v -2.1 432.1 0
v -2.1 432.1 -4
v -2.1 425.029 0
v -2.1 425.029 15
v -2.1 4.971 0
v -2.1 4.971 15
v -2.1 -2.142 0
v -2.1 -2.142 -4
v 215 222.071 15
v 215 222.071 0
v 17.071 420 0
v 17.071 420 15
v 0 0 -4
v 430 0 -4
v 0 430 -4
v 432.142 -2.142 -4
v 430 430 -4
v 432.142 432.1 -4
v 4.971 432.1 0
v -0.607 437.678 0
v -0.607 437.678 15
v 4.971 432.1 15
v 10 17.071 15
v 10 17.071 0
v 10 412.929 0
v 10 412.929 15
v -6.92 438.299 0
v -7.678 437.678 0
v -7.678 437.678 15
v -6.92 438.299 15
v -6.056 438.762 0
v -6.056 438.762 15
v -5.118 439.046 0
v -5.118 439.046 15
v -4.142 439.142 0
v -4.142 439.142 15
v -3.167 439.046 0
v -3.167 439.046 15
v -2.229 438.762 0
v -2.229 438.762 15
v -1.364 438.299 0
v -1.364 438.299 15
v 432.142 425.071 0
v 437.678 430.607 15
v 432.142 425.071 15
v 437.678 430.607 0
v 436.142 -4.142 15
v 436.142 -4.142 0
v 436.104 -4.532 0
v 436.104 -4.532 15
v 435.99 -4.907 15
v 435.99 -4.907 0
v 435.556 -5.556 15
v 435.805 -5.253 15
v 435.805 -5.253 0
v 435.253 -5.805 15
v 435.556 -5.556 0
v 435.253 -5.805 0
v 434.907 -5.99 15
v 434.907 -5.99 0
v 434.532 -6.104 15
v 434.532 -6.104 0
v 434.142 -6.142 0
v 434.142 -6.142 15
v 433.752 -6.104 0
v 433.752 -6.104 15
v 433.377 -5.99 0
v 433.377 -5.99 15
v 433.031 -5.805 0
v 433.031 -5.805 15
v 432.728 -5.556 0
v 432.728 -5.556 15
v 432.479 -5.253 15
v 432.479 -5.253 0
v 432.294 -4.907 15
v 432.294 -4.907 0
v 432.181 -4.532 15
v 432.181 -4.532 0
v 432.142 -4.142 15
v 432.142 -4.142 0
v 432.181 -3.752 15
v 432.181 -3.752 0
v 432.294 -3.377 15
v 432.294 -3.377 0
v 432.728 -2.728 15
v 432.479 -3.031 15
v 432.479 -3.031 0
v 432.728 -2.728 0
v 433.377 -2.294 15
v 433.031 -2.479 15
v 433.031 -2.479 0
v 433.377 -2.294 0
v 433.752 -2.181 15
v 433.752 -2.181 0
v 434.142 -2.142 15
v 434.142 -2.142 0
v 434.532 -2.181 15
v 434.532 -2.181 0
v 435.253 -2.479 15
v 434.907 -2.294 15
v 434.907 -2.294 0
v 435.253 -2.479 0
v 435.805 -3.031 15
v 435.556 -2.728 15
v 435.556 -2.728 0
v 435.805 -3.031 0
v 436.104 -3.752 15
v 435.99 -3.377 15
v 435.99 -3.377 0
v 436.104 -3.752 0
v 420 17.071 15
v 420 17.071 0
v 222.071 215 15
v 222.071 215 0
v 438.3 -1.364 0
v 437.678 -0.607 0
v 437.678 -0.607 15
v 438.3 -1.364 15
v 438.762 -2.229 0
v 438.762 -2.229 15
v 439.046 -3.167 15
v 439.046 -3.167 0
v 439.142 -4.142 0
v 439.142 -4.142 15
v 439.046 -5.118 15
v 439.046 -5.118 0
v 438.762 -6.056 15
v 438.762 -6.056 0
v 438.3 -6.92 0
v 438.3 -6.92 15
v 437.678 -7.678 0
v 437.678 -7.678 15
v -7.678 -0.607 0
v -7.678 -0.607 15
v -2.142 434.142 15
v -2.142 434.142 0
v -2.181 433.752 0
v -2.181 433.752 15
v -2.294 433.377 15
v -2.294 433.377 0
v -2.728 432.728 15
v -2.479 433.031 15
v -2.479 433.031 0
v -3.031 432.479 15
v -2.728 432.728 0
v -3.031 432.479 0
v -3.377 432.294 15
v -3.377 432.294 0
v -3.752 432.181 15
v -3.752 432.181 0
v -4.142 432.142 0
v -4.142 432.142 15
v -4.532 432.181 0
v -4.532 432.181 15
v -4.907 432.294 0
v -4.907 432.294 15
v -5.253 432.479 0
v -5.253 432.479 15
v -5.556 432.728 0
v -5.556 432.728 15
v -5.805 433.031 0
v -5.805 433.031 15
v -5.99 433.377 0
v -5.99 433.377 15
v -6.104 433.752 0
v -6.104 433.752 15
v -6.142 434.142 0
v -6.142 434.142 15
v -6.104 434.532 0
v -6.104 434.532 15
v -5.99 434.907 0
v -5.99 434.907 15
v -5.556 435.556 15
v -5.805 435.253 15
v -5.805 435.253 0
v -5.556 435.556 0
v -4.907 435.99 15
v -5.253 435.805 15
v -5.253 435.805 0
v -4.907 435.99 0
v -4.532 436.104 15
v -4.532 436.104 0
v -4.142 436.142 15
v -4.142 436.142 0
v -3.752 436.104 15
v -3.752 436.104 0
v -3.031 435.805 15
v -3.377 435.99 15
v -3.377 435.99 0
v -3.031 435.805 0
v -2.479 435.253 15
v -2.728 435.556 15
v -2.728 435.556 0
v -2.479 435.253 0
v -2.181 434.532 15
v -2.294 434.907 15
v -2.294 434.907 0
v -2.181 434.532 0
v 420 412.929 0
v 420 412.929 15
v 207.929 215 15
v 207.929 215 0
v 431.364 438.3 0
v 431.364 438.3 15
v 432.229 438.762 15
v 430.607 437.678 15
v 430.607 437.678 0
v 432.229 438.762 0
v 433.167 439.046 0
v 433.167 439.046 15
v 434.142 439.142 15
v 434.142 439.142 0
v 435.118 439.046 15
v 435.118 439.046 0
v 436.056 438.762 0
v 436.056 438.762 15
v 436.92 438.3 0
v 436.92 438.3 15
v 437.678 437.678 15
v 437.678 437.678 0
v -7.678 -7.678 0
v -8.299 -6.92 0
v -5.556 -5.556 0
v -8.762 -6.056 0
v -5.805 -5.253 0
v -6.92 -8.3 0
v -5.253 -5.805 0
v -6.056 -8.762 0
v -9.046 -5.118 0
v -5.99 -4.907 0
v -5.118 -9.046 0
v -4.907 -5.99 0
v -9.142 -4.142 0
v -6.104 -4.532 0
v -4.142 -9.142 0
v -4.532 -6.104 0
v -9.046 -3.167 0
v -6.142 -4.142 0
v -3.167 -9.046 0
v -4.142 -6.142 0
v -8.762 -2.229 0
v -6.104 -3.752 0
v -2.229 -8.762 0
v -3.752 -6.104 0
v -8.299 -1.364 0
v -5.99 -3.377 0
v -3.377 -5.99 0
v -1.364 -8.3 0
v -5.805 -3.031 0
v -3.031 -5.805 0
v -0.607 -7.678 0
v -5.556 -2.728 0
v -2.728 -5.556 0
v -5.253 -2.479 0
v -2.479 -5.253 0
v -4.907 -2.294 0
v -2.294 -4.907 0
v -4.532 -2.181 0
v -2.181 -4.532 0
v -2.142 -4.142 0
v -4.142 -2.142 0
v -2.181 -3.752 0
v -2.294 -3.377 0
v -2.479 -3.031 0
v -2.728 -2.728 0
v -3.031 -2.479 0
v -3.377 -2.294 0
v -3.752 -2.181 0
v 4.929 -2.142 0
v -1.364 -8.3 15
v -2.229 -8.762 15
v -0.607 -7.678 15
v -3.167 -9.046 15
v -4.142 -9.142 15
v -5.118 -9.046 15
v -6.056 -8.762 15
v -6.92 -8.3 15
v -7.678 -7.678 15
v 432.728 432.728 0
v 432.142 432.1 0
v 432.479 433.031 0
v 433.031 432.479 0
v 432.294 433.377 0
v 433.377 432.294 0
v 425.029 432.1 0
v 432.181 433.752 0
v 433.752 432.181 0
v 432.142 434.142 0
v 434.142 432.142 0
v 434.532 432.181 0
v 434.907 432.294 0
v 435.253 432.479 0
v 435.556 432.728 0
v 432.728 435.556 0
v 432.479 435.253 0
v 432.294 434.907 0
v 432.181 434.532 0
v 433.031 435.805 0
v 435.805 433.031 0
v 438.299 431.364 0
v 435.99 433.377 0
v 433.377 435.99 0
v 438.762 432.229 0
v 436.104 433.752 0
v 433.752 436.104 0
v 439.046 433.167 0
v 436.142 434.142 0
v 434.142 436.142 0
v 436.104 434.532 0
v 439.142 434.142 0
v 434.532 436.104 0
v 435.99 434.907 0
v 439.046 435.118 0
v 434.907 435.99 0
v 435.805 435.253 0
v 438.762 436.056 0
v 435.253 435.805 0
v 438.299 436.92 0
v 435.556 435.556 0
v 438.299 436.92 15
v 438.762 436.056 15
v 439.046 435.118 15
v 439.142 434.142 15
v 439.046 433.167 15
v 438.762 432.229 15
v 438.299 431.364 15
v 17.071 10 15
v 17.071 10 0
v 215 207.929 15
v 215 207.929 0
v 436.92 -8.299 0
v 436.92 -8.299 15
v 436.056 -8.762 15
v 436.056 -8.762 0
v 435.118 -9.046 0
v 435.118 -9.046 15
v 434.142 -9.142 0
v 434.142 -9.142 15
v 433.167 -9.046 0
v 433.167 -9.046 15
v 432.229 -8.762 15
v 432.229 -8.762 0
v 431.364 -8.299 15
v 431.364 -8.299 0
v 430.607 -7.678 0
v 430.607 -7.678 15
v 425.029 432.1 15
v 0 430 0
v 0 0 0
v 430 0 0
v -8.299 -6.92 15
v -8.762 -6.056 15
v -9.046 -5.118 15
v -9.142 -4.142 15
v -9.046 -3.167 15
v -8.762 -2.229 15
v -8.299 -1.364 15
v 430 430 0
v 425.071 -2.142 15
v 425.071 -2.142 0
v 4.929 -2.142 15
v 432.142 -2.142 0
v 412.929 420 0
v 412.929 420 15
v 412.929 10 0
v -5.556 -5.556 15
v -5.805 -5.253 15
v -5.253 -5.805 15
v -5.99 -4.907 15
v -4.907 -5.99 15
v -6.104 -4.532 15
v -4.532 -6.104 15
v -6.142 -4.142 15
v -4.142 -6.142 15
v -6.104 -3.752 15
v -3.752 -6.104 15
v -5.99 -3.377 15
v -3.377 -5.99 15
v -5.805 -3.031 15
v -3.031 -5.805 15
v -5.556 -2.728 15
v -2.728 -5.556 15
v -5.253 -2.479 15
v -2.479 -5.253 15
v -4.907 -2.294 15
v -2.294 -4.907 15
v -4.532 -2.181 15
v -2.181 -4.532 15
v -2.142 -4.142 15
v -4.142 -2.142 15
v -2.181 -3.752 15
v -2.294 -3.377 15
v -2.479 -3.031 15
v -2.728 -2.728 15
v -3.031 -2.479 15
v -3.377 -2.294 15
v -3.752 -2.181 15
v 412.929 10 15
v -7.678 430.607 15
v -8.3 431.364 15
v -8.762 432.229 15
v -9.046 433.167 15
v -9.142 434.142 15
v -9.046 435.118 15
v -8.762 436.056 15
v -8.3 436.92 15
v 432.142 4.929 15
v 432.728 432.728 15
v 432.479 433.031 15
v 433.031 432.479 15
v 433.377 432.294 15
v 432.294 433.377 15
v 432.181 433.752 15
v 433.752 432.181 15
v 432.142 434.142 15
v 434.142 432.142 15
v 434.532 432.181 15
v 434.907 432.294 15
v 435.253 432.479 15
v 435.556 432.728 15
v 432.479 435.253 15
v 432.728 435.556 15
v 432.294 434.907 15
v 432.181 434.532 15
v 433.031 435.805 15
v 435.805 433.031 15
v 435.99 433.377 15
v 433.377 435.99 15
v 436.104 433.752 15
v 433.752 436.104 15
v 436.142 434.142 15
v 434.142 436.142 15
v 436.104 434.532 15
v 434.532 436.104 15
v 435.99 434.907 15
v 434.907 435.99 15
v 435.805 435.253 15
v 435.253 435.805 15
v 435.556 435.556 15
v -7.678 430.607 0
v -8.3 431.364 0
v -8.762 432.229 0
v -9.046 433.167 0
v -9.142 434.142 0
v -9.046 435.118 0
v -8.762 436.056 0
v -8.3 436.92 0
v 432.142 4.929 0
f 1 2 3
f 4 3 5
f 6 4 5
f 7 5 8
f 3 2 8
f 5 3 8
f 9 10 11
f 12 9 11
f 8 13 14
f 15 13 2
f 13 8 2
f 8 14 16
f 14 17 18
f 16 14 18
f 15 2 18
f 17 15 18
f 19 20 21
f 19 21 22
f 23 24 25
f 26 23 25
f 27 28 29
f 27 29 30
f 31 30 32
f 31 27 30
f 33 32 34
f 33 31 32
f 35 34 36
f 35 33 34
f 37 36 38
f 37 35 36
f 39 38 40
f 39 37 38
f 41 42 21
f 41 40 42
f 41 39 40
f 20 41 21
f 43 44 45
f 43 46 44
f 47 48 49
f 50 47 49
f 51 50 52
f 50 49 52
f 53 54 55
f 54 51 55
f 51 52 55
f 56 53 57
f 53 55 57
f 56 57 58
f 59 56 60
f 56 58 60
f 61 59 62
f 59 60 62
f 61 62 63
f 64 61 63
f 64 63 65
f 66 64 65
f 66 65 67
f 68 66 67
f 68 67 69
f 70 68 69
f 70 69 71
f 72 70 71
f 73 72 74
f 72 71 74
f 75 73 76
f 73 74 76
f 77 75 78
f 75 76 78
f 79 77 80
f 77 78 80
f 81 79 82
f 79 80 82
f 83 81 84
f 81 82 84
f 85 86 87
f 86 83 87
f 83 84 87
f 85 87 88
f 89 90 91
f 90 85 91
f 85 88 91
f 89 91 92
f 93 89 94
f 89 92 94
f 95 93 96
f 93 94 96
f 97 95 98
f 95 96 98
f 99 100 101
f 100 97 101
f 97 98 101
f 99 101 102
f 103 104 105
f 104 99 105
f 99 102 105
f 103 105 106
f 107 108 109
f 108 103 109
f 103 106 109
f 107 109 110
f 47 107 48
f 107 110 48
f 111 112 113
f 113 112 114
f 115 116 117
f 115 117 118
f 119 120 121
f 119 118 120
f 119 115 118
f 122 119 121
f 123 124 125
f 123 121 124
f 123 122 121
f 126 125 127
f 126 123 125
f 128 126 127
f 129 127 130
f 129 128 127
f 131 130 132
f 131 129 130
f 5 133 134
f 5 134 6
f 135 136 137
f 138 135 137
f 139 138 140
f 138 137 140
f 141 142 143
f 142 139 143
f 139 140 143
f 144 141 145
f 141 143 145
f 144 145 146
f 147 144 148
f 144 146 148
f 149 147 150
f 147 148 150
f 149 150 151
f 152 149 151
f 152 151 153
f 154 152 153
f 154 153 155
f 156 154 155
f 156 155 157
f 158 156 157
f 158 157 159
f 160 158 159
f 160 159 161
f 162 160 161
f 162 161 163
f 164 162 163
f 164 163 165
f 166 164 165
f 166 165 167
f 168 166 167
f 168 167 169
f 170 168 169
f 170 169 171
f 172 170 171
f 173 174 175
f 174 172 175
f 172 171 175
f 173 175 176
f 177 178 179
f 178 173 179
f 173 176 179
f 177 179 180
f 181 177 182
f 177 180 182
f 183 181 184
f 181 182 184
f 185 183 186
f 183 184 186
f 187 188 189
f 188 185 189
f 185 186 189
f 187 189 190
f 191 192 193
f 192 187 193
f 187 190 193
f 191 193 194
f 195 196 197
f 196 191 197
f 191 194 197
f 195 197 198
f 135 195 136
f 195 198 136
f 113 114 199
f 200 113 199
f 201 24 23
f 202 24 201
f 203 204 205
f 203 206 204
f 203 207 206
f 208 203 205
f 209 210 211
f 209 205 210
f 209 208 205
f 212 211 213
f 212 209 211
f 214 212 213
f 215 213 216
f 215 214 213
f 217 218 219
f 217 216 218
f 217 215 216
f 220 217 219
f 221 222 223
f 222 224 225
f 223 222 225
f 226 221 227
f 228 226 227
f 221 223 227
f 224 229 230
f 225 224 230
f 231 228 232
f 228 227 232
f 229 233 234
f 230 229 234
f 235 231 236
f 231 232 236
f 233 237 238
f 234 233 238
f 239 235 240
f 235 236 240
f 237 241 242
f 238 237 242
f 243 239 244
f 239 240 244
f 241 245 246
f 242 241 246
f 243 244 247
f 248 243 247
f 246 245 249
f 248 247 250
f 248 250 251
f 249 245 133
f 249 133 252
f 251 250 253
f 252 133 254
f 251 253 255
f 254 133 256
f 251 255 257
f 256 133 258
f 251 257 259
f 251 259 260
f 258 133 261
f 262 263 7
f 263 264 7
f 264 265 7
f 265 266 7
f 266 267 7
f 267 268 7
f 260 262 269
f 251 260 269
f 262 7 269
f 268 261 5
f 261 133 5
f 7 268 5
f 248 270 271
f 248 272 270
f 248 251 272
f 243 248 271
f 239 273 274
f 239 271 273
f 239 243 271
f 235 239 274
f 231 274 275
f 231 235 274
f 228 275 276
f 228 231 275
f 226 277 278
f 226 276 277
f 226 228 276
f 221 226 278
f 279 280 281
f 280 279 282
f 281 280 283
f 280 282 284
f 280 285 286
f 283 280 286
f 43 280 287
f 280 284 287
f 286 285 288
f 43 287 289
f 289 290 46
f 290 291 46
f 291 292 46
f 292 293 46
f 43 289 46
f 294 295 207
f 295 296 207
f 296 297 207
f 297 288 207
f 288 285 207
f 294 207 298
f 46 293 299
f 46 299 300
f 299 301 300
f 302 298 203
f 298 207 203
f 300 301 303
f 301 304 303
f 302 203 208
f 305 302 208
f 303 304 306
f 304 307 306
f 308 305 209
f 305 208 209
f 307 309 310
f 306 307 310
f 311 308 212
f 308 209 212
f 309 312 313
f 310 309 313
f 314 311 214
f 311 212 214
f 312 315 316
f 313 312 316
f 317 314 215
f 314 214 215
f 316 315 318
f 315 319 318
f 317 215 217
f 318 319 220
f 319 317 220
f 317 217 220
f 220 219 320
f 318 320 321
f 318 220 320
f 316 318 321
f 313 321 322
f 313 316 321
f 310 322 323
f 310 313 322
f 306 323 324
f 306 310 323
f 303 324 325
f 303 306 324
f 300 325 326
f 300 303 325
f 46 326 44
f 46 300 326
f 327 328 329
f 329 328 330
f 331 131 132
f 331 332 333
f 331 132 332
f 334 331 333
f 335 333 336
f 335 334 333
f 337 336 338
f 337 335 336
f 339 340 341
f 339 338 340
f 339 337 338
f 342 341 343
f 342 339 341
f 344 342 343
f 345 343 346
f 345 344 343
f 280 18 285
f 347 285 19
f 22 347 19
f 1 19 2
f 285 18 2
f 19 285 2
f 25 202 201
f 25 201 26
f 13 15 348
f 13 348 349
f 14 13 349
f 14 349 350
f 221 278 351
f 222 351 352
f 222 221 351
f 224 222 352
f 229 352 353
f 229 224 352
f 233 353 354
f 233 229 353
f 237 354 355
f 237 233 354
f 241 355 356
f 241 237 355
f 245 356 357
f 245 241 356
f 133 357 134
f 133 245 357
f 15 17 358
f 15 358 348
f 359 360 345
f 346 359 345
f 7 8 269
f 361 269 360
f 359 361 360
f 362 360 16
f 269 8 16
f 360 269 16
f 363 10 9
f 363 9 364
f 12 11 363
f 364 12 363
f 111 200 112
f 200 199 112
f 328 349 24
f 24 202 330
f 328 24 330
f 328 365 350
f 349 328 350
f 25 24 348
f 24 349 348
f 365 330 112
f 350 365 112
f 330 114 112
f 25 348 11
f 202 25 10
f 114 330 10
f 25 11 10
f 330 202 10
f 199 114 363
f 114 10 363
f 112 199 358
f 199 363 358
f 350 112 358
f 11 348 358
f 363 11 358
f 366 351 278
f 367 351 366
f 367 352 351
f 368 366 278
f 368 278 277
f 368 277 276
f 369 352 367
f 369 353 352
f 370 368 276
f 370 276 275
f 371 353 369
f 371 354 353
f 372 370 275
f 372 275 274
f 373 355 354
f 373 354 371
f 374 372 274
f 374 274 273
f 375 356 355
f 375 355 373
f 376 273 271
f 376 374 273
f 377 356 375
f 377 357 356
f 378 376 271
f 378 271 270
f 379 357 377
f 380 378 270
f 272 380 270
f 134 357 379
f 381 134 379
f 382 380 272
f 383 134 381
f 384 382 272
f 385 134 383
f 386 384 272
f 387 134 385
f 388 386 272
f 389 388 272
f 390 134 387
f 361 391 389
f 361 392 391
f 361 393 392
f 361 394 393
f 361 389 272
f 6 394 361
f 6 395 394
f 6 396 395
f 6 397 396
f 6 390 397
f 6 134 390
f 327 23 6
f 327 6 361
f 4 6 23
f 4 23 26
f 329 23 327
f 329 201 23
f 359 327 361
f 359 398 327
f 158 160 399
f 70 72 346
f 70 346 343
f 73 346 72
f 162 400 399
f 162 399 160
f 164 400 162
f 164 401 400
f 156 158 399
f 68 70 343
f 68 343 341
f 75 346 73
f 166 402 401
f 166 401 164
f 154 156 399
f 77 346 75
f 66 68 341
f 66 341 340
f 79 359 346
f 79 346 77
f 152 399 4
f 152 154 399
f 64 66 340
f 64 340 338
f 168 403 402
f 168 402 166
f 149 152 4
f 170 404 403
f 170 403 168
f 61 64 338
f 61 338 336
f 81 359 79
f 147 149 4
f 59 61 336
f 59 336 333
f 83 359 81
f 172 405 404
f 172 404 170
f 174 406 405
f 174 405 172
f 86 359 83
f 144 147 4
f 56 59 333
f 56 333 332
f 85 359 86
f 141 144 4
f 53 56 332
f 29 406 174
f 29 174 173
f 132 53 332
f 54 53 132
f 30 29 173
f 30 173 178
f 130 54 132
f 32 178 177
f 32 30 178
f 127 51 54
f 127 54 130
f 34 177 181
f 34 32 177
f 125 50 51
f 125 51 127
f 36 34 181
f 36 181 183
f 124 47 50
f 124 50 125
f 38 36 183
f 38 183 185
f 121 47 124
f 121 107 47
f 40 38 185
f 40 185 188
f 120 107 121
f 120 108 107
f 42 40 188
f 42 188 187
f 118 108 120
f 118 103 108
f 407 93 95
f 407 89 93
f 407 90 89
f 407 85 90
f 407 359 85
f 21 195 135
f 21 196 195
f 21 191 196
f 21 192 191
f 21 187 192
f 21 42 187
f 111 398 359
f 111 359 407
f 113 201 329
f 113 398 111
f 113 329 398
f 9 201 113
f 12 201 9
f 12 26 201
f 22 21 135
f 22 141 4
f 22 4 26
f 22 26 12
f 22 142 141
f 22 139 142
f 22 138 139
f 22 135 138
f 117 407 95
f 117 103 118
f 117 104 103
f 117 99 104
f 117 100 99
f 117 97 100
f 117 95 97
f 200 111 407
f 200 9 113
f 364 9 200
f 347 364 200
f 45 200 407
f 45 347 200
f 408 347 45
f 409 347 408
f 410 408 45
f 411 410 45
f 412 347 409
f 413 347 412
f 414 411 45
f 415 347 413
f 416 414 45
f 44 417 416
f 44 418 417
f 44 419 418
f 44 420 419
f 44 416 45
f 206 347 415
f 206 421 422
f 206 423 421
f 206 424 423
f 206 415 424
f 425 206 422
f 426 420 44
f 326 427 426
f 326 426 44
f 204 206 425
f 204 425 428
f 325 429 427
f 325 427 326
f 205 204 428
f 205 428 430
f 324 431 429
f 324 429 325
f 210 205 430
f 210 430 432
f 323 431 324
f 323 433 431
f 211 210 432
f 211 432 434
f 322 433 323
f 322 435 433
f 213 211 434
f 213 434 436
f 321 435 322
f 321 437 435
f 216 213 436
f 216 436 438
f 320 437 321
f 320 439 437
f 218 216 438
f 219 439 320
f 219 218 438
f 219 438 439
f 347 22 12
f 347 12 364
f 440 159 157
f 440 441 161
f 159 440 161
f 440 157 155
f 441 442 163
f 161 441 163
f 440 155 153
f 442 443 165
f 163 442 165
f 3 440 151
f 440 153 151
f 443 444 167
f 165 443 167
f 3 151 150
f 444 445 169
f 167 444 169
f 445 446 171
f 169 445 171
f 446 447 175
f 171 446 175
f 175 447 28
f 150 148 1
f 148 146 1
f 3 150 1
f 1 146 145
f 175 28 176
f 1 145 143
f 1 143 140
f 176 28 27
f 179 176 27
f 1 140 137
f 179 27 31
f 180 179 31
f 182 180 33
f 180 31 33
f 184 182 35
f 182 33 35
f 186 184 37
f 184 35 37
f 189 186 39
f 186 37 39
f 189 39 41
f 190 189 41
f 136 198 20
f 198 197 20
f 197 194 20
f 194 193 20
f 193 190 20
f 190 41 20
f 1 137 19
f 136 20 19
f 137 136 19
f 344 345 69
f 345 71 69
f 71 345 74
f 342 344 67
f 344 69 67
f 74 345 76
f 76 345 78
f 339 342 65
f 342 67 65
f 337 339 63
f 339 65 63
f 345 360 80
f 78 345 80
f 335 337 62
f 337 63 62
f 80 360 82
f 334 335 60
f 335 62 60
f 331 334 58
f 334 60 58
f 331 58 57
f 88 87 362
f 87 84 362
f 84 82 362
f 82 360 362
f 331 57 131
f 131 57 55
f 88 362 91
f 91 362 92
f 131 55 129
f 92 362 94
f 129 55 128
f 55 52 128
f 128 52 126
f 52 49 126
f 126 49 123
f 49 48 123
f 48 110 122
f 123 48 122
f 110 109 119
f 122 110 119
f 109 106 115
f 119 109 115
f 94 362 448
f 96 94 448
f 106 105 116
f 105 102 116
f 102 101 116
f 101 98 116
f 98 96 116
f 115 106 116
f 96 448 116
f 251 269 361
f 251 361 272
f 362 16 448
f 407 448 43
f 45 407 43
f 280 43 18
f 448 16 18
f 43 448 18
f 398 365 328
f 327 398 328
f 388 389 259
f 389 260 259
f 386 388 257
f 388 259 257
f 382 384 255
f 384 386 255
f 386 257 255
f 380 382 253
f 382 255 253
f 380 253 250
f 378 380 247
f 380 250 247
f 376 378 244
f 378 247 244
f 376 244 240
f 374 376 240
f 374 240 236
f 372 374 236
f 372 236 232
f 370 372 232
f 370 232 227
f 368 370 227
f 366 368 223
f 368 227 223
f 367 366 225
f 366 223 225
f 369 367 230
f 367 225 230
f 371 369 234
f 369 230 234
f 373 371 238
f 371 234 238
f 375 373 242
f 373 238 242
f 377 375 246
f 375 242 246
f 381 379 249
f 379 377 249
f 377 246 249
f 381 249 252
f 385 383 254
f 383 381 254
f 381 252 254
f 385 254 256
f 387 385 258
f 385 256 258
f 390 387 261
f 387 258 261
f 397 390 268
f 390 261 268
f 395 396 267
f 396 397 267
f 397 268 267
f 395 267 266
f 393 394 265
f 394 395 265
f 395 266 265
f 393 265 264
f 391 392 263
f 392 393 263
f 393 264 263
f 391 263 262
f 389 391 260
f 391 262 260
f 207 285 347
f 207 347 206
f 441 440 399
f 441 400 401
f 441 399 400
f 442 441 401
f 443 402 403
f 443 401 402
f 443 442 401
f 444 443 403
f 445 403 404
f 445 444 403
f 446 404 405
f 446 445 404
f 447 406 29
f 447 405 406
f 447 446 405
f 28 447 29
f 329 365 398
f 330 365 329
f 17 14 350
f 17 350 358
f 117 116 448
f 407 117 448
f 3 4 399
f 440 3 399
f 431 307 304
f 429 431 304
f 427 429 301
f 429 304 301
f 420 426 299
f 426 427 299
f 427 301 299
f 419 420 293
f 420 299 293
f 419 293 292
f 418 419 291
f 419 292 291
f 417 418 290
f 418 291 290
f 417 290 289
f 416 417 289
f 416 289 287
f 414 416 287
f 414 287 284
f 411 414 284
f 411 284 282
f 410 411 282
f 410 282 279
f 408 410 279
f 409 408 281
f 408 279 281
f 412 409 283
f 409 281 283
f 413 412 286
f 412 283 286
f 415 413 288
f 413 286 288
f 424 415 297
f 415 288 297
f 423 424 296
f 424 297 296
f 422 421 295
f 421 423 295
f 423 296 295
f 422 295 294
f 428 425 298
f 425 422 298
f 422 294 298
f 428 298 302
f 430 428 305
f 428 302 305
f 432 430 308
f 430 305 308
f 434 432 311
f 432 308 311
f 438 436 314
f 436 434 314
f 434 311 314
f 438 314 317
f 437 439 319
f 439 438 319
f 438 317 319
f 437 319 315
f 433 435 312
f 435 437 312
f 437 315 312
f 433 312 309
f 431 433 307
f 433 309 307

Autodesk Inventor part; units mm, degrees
ref_plane "YZ Plane" through (0, 0, 0) normal (1, 0, 0) x (0, 1, 0)
ref_plane "XZ Plane" through (0, 0, 0) normal (0, 1, 0) x (-1, 0, 0)
ref_plane "XY Plane" through (0, 0, 0) normal (0, 0, 1) x (1, 0, 0)
sketch "Esboço1" plane through (0, 0, 0) normal (0, 0, 1) x (1, 0, 0)
  line L0 (7.0711, 0) -> (422.9289, 0)
  line L1 (430, 7.0711) -> (430, 422.9289)
  line L2 (422.9289, 430) -> (7.0711, 430)
  line L3 (0, 422.9289) -> (0, 7.0711)
  line L4 (17.0711, 420) -> (412.9289, 420)
  line L5 (420, 412.9289) -> (420, 17.0711)
  line L6 (412.9289, 10) -> (17.0711, 10)
  line L7 (10, 17.0711) -> (10, 412.9289)
  line L8 (420, 17.0711) -> (222.0711, 215)
  line L9 (215, 222.0711) -> (17.0711, 420)
  line L10 (412.9289, 10) -> (215, 207.9289)
  line L11 (207.9289, 215) -> (10, 412.9289)
  line L12 (10, 17.0711) -> (207.9289, 215)
  line L13 (215, 222.0711) -> (412.9289, 420)
  line L14 (17.0711, 10) -> (215, 207.9289)
  line L15 (222.0711, 215) -> (420, 412.9289)
  line L16 (425.0292, 432.1003) -> (430.6066, 437.6777)
  line L17 (437.6777, 437.6777) -> (437.6777, 437.6777)
  line L18 (437.6777, 430.6066) -> (432.1421, 425.0711)
  line L19 (-2.1003, 425.0292) -> (-7.6777, 430.6066)
  line L20 (-7.6777, 437.6777) -> (-7.6777, 437.6777)
  line L21 (-0.6066, 437.6777) -> (4.9708, 432.1003)
  line L22 (4.9289, -2.1421) -> (-0.6066, -7.6777)
  line L23 (-7.6777, -7.6777) -> (-7.6777, -7.6777)
  line L24 (-7.6777, -0.6066) -> (-2.1003, 4.9708)
  line L25 (425.0711, -2.1421) -> (430.6066, -7.6777)
  line L26 (437.6777, -7.6777) -> (437.6777, -7.6777)
  line L27 (437.6777, -0.6066) -> (432.1421, 4.9289)
  arc A0 (437.6777, 430.6066) -> (437.6777, 437.6777) centre (434.1421, 434.1421) ccw
  arc A1 (437.6777, 437.6777) -> (430.6066, 437.6777) centre (434.1421, 434.1421) ccw
  arc A2 (-0.6066, 437.6777) -> (-7.6777, 437.6777) centre (-4.1421, 434.1421) ccw
  arc A3 (-7.6777, 437.6777) -> (-7.6777, 430.6066) centre (-4.1421, 434.1421) ccw
  arc A4 (-7.6777, -0.6066) -> (-7.6777, -7.6777) centre (-4.1421, -4.1421) ccw
  arc A5 (-7.6777, -7.6777) -> (-0.6066, -7.6777) centre (-4.1421, -4.1421) ccw
  arc A6 (430.6066, -7.6777) -> (437.6777, -7.6777) centre (434.1421, -4.1421) ccw
  arc A7 (437.6777, -7.6777) -> (437.6777, -0.6066) centre (434.1421, -4.1421) ccw
  circle A8 centre (-4.1421, 434.1421) radius 2
  circle A9 centre (434.1421, 434.1421) radius 2
  circle A10 centre (434.1421, -4.1421) radius 2
  circle A11 centre (-4.1421, -4.1421) radius 2
  line L28 (432.1421, 432.1003) -> (-2.1003, 432.1003)
  line L29 (-2.1003, 432.1003) -> (-2.1003, -2.1421)
  line L30 (-2.1003, -2.1421) -> (432.1421, -2.1421)
  line L31 (432.1421, -2.1421) -> (432.1421, 432.1003)
  line L32 (0, 0) -> (430, 0)
  line L33 (430, 0) -> (430, 430)
  line L34 (430, 430) -> (0, 430)
  line L35 (0, 430) -> (0, 0)
  point P0 (-7.6777, -7.6777)
  dimension "d2" = 10
  dimension "d11" = 5
  dimension "d12" = 4
  dimension "d13" = 4
  dimension "d14" = 4
  dimension "d15" = 4
extrude "Extrusão2" add sketch "Esboço1" along normal blind 15 contours L32 L35 L3 L34 L2 L33 L1 L0 | L16 A1 A0 L18 L31 L28 | L28 L29 L19 A3 A2 L21 | L27 A7 A6 L25 L30 L31 | L29 L30 L22 A5 A4 L24
extrude "Extrusão3" add sketch "Esboço1" along normal blind 15 and the other way blind 4 contours L28 L31 L30 L29
properties part number "base de calibração" material "MDF - Chapa de fibra de média densidade"
